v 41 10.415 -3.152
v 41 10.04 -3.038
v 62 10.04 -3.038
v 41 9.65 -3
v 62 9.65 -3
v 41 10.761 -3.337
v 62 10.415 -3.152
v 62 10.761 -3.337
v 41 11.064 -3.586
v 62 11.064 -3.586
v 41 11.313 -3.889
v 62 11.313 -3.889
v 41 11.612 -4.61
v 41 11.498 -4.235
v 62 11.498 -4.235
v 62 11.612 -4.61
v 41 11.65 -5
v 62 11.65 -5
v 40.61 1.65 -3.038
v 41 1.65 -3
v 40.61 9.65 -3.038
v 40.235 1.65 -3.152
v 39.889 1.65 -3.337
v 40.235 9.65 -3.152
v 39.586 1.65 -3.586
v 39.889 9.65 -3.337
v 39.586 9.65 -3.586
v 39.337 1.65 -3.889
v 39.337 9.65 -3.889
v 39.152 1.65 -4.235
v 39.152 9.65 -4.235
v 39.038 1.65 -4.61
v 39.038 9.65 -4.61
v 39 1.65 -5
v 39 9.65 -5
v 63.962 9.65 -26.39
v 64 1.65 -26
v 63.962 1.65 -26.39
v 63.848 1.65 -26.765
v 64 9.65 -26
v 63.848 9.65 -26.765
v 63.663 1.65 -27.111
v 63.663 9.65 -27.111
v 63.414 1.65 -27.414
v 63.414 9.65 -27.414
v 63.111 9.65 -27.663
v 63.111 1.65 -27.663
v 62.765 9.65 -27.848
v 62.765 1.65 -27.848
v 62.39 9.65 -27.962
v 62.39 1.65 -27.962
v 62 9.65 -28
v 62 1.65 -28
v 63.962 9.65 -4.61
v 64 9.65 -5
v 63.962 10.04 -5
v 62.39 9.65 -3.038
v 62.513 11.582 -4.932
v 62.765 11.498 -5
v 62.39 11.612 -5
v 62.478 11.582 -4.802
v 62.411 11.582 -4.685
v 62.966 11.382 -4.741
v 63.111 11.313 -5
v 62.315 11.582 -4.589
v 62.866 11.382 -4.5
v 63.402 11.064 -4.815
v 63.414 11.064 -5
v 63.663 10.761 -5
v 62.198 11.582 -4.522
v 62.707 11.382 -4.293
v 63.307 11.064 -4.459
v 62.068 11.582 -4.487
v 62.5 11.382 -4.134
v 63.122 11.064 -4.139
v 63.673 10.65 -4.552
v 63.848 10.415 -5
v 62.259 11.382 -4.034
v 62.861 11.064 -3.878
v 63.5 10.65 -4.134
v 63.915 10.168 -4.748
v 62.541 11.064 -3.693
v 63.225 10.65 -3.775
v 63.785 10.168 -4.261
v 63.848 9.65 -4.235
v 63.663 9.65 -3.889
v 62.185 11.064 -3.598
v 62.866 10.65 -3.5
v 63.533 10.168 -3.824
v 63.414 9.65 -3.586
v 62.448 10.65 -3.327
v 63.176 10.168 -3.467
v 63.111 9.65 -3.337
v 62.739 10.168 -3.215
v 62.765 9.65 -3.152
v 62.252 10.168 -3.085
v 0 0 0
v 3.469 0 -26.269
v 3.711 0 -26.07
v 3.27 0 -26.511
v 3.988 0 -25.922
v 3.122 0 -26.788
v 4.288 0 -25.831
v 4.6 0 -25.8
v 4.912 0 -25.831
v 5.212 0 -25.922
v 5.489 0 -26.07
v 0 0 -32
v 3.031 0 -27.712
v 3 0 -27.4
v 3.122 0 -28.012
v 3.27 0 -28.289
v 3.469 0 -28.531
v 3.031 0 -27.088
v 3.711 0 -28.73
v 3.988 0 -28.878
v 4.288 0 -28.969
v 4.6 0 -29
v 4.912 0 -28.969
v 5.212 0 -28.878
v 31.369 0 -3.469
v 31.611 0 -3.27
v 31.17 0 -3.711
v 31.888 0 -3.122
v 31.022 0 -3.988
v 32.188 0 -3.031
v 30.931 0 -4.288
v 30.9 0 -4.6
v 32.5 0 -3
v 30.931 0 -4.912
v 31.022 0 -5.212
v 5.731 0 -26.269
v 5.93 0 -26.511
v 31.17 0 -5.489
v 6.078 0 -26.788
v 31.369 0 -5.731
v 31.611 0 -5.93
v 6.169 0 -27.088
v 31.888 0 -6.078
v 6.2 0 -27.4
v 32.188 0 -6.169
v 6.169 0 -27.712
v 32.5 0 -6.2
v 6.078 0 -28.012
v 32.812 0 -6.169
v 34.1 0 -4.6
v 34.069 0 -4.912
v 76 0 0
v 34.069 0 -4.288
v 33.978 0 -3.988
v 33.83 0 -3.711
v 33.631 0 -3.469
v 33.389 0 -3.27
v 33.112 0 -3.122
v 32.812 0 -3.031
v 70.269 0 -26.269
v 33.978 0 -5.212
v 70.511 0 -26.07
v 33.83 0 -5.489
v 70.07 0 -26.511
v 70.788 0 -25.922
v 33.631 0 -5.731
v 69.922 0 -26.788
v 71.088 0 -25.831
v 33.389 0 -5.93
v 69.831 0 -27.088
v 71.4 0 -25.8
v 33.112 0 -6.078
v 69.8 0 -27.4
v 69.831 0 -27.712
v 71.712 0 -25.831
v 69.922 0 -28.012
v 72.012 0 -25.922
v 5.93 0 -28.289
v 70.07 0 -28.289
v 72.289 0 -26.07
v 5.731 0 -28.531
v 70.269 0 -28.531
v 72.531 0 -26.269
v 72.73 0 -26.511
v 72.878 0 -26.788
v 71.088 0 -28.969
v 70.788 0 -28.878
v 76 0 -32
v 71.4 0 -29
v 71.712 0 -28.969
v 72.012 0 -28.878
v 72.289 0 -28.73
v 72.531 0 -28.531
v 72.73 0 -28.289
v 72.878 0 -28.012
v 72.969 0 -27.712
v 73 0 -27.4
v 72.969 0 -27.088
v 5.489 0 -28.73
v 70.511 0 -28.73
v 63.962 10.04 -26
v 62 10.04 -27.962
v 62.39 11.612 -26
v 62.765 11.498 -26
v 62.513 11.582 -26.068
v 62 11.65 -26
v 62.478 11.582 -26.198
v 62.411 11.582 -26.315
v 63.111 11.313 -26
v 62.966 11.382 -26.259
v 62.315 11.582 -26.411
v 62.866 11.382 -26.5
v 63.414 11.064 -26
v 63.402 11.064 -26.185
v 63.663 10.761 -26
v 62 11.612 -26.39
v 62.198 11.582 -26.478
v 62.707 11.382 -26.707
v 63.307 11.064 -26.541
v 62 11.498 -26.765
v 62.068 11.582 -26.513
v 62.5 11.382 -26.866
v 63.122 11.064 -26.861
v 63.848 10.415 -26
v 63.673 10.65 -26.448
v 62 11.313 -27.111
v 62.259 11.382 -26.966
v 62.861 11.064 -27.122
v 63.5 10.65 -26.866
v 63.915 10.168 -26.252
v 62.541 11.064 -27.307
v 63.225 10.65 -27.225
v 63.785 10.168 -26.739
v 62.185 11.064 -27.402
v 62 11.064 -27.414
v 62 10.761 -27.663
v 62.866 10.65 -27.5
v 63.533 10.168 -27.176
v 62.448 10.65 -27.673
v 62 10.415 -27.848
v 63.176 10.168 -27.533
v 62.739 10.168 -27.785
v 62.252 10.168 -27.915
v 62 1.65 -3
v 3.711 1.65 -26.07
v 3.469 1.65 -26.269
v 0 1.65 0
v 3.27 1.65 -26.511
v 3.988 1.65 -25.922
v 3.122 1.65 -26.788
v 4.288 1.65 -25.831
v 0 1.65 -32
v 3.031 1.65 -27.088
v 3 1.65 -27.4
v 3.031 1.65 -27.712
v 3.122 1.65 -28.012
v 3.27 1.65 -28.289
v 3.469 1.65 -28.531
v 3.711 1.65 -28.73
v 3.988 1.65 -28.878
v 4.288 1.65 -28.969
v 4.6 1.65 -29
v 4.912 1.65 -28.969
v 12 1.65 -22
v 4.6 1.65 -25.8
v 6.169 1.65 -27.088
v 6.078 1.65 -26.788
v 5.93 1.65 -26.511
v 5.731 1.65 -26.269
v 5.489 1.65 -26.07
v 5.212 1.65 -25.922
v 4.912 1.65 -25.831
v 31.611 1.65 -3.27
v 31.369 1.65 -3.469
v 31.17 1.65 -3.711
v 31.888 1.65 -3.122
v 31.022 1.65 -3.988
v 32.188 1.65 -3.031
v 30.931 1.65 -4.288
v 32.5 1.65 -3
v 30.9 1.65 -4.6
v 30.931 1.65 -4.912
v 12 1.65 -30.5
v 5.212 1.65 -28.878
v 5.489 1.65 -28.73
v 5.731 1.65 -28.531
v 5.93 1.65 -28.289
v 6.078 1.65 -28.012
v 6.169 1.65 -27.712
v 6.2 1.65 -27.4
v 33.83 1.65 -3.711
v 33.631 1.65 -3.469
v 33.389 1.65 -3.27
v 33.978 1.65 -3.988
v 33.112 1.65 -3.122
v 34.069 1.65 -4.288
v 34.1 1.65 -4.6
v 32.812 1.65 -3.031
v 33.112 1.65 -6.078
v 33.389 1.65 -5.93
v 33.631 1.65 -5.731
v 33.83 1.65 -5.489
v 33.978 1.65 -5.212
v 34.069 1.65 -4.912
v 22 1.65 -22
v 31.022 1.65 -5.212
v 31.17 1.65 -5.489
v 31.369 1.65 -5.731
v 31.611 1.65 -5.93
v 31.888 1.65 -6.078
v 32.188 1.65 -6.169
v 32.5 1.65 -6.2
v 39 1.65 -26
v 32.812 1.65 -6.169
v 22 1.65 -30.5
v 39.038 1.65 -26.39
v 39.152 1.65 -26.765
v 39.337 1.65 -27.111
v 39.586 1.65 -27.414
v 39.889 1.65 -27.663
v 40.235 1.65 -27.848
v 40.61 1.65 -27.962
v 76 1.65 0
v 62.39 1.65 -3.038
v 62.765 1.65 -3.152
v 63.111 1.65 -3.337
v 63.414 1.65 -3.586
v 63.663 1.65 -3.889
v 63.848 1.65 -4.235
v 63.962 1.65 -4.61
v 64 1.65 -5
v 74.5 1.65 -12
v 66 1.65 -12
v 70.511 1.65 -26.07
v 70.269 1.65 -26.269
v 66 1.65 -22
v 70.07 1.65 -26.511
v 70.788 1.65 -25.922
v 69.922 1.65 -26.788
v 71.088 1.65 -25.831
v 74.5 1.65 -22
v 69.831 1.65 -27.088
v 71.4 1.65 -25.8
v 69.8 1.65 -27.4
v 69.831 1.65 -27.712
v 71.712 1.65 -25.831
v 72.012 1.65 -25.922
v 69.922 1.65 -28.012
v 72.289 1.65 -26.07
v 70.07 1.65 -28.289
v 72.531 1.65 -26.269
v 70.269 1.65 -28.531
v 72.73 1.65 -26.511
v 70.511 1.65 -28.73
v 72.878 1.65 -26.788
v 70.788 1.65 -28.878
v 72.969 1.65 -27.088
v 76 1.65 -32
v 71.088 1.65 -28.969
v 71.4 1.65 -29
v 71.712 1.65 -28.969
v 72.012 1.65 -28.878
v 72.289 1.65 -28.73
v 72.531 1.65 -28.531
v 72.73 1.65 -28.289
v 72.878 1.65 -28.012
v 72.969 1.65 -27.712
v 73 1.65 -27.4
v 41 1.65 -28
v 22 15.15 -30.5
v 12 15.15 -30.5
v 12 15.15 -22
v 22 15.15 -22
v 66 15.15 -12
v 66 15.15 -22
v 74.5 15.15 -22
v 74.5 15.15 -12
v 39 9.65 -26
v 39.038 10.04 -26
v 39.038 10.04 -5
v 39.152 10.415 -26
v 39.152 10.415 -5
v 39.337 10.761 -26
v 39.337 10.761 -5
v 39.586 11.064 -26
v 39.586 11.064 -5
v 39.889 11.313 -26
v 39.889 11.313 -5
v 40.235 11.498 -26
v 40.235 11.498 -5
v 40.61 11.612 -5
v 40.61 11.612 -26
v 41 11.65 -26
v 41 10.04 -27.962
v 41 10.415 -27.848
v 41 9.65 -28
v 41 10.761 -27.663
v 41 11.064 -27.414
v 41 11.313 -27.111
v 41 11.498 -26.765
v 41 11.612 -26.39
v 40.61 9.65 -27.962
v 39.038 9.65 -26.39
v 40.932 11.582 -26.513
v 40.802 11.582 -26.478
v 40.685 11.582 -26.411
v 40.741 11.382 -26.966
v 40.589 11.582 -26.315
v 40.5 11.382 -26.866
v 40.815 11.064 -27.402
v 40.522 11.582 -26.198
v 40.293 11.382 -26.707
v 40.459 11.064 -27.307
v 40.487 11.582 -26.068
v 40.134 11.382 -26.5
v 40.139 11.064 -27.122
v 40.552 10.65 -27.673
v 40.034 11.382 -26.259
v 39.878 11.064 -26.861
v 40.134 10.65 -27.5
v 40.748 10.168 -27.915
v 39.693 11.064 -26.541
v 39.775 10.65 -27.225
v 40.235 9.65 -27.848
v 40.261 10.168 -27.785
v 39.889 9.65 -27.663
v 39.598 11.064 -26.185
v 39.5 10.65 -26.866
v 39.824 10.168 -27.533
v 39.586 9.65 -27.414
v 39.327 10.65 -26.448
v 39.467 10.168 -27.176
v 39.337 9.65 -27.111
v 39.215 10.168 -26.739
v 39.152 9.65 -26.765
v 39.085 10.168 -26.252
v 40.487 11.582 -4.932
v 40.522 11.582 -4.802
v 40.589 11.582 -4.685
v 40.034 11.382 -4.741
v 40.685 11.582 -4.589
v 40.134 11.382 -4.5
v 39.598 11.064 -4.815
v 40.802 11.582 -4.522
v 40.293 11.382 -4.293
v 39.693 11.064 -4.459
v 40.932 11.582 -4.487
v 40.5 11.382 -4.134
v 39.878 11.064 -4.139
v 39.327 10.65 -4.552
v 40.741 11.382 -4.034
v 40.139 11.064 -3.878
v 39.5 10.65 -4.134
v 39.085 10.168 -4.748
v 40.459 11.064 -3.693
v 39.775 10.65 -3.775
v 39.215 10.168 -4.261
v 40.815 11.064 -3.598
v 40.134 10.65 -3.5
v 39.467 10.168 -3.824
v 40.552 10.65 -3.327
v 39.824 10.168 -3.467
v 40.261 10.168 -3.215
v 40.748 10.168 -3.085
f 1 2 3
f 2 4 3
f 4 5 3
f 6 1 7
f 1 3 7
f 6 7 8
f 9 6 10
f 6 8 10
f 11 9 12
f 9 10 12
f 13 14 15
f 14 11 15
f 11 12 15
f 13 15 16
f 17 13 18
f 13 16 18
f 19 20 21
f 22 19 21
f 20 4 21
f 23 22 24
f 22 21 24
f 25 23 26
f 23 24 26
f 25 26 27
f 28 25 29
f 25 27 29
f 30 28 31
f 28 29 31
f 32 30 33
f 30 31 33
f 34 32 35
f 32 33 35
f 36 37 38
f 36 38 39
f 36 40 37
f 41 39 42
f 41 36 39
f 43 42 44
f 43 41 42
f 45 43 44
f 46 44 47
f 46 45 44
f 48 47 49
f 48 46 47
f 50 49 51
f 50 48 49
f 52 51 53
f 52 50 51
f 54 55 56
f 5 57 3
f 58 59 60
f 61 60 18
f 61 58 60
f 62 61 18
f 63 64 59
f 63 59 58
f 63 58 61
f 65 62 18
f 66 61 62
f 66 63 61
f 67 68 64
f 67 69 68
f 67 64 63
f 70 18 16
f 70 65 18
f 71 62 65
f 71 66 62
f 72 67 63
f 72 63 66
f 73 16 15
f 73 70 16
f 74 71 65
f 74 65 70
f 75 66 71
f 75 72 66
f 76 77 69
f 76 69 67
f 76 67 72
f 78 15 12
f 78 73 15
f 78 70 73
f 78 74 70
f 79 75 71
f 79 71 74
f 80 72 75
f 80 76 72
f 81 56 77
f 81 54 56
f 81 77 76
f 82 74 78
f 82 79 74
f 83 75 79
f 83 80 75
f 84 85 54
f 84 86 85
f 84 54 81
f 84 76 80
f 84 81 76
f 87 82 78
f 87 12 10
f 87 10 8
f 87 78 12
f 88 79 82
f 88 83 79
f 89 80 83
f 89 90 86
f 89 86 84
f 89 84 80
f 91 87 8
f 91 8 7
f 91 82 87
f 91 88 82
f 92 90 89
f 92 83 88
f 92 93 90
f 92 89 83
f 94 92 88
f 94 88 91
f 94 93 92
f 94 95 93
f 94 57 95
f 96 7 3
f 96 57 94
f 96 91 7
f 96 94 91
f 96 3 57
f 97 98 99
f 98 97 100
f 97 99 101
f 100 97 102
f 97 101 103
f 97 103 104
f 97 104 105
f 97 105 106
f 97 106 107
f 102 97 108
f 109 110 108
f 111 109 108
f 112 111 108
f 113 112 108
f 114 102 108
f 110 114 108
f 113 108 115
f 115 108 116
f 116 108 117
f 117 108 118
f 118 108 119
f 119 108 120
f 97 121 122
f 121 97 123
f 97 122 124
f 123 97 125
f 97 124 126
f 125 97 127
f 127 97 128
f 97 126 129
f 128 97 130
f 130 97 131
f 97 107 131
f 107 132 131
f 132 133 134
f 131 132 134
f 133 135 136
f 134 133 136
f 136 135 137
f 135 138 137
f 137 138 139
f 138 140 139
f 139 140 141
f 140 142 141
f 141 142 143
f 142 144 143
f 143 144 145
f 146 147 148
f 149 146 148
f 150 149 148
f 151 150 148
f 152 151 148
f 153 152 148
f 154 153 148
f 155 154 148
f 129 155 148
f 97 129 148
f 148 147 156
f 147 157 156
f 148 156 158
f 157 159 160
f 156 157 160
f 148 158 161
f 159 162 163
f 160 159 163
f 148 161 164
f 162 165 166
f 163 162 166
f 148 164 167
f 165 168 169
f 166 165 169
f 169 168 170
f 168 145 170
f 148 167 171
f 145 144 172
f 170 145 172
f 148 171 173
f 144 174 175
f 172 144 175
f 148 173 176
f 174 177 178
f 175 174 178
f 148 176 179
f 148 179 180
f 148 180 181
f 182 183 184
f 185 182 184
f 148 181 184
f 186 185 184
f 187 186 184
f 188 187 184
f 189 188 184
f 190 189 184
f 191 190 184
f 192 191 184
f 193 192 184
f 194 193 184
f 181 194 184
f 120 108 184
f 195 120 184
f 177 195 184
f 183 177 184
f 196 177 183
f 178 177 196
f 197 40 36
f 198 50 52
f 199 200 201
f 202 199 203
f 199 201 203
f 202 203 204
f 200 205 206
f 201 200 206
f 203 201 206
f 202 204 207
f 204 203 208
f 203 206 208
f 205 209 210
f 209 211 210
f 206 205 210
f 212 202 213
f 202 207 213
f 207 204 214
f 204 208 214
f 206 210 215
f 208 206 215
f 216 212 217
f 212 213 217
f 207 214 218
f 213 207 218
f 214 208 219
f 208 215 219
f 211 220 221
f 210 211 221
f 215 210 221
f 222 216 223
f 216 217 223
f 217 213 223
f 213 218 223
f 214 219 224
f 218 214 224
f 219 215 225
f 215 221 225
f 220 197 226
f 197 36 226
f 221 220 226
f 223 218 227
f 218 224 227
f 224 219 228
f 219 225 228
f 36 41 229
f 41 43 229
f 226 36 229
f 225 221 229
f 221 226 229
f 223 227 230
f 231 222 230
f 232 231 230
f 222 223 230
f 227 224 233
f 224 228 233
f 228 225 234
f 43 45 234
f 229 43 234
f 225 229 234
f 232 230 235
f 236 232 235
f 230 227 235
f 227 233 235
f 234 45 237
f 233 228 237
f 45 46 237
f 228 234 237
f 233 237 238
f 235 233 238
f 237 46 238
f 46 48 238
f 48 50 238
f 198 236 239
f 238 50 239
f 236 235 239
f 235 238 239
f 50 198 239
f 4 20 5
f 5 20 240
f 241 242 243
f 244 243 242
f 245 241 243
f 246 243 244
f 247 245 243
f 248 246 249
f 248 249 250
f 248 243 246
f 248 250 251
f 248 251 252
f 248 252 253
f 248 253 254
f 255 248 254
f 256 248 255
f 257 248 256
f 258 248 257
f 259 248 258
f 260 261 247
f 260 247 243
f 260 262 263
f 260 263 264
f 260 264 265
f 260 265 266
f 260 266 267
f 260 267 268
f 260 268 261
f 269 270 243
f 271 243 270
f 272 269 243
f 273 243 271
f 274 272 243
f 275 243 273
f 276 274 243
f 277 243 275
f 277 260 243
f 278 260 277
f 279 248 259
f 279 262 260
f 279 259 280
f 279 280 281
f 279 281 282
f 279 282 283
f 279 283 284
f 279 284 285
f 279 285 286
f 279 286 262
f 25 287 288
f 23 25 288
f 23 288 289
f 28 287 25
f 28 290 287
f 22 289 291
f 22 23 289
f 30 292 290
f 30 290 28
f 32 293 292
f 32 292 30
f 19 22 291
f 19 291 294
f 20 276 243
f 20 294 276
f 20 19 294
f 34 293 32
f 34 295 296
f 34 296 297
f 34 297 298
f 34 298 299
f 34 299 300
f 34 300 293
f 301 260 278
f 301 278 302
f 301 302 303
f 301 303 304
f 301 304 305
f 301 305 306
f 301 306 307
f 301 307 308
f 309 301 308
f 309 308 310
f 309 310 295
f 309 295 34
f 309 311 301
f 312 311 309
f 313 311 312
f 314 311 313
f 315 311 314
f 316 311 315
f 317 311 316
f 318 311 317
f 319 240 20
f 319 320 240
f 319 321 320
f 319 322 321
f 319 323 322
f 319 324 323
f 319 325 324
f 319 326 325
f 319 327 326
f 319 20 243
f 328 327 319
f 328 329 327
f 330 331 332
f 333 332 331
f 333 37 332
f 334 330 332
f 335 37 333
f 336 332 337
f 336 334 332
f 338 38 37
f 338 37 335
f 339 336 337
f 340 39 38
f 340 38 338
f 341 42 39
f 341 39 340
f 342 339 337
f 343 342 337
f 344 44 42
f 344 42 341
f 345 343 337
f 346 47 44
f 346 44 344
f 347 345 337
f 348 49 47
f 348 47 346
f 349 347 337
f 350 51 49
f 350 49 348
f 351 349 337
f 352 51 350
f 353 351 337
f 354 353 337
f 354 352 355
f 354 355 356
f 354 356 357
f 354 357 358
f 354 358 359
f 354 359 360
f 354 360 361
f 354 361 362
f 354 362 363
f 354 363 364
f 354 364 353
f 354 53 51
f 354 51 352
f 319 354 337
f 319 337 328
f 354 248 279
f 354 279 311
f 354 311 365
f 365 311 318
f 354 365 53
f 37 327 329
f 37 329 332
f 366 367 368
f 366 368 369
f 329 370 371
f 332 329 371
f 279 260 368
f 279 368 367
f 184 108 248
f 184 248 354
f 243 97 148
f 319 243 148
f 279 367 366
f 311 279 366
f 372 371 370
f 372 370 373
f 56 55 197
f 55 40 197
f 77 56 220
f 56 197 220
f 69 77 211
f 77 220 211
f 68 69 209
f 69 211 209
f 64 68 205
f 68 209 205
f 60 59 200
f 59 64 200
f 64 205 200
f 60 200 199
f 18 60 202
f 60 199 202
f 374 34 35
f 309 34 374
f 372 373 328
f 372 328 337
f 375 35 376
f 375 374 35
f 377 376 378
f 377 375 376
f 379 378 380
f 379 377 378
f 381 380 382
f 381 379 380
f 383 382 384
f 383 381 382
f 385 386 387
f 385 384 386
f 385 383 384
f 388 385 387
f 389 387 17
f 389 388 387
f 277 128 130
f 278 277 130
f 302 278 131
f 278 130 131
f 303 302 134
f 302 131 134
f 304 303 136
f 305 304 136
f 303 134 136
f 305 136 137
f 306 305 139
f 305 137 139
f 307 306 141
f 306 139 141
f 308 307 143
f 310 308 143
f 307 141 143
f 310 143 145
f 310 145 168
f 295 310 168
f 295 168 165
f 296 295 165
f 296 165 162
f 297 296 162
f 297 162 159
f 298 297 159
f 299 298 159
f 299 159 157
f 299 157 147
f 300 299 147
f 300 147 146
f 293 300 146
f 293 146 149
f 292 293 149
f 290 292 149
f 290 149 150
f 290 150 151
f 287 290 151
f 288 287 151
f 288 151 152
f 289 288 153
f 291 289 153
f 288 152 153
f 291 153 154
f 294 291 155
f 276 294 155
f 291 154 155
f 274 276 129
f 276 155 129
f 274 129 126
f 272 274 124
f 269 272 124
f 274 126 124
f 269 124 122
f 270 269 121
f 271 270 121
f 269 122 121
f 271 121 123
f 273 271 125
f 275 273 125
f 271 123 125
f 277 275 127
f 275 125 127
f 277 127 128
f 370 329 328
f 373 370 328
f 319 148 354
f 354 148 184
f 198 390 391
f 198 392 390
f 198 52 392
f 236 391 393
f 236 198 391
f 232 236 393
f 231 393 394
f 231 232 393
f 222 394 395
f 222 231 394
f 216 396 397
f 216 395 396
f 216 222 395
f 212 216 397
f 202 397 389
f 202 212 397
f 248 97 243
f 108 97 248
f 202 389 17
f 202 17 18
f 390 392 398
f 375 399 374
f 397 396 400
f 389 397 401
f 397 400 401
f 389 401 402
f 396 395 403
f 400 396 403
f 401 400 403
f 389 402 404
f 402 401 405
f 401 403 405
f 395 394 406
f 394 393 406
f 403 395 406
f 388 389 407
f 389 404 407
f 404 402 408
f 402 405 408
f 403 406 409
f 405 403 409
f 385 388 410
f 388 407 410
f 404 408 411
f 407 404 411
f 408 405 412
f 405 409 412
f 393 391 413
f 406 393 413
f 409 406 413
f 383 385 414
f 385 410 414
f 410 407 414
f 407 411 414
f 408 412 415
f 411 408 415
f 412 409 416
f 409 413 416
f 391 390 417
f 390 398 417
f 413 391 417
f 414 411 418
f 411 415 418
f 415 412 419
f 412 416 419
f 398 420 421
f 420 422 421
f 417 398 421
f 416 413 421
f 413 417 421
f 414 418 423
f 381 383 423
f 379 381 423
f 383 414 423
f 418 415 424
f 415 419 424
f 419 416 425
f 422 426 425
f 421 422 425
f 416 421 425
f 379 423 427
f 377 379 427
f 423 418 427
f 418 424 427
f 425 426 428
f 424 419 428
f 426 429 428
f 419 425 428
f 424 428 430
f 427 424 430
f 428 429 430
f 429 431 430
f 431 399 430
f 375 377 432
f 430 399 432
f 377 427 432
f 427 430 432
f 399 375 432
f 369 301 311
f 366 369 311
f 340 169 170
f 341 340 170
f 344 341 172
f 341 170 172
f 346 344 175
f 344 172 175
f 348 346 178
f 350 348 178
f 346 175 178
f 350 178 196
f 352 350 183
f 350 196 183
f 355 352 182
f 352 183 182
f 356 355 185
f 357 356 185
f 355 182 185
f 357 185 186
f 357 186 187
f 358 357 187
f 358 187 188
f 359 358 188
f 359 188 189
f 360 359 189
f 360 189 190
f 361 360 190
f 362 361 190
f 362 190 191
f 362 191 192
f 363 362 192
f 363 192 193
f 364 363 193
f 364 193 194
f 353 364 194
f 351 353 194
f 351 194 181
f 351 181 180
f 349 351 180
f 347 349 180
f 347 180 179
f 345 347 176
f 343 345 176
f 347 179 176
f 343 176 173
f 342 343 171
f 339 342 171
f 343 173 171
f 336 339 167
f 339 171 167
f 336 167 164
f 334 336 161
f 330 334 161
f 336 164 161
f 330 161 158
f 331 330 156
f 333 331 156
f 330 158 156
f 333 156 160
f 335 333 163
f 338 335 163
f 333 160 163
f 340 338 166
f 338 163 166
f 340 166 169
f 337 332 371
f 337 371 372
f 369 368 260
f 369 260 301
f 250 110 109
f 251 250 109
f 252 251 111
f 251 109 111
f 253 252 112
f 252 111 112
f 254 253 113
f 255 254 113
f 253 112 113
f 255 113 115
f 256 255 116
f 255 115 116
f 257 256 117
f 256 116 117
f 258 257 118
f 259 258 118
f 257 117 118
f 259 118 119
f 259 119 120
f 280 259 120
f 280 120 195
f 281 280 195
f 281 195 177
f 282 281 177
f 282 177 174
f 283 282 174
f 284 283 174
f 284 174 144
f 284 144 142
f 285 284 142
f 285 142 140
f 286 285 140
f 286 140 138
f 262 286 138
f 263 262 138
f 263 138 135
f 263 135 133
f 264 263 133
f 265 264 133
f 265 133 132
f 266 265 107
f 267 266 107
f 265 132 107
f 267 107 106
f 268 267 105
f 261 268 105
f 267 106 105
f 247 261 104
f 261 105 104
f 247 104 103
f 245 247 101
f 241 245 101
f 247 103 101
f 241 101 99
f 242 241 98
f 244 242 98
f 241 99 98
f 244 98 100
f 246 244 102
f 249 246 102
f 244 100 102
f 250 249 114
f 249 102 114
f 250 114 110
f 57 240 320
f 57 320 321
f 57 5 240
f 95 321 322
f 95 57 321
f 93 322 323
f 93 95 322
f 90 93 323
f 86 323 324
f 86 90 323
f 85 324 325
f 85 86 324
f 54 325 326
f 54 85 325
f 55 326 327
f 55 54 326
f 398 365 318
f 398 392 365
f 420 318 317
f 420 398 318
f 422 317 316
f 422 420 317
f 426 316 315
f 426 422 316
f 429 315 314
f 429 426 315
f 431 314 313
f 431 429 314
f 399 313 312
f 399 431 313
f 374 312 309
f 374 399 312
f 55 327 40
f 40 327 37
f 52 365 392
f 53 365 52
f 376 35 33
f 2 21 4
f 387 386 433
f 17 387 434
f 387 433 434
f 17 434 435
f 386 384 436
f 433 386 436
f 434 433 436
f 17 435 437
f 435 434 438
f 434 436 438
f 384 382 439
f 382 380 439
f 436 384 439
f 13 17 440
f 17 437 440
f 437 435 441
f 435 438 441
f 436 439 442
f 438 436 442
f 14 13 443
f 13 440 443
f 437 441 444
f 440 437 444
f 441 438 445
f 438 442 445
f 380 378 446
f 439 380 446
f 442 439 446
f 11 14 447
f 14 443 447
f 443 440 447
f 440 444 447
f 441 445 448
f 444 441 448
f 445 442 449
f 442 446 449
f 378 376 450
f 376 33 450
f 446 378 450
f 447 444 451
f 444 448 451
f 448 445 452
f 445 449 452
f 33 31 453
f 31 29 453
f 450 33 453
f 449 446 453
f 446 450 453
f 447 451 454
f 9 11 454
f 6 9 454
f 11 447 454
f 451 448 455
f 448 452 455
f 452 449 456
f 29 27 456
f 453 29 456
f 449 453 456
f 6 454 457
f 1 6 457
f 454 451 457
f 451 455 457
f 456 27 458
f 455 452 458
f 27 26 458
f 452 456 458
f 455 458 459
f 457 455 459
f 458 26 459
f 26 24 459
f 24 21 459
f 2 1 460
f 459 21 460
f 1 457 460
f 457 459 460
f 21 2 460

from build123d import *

# Parameters (mm, degrees)
SKETCH1_W                = 76
SKETCH1_H                = 32
BOSS_EXTRUDE1_DEPTH      = 1.65
M3_CLEARANCE_HOLE1_D     = 3.2
M3_CLEARANCE_HOLE1_DEPTH = 20
M3_CLEARANCE_HOLE1_TIP   = 0.96137699
SKETCH4_W                = 10
SKETCH4_H                = 8.5
SKETCH4_W_2              = 8.5
SKETCH4_H_2              = 10
BOSS_EXTRUDE2_DEPTH      = 13.5
SKETCH5_W                = 25
SKETCH5_H                = 25
BOSS_EXTRUDE3_DEPTH      = 10
FILLET1_R                = 2


with BuildPart() as part:
    # Sketch1 → Boss-Extrude1 (new body)
    with BuildSketch(Plane(origin=(0, 0, 0), x_dir=(1, 0, 0), z_dir=(0, 1, 0))):
        with Locations((38, 16)):
            Rectangle(SKETCH1_W, SKETCH1_H)
    extrude(amount=BOSS_EXTRUDE1_DEPTH)

    # M3 Clearance Hole1
    with Locations(Plane(origin=(0, 1.65, 0), x_dir=(1, 0, 0), z_dir=(0, 1, 0))):
        with Locations((71.4, 27.4), (32.5, 4.6), (4.6, 27.4)):
            Hole(M3_CLEARANCE_HOLE1_D / 2, depth=M3_CLEARANCE_HOLE1_DEPTH)
            with Locations((0, 0, -(M3_CLEARANCE_HOLE1_DEPTH + M3_CLEARANCE_HOLE1_TIP / 2))):  # 118° drill point
                Cone(0, M3_CLEARANCE_HOLE1_D / 2, M3_CLEARANCE_HOLE1_TIP, mode=Mode.SUBTRACT)

    # Sketch4 → Boss-Extrude2 (add)
    with BuildSketch(Plane(origin=(0, 1.65, 0), x_dir=(1, 0, 0), z_dir=(0, 1, 0))):
        with Locations((17, 26.25)):
            Rectangle(SKETCH4_W, SKETCH4_H)
        with Locations((70.25, 17)):
            Rectangle(SKETCH4_W_2, SKETCH4_H_2)
    extrude(amount=BOSS_EXTRUDE2_DEPTH)

    # Sketch5 → Boss-Extrude3 (add)
    with BuildSketch(Plane(origin=(0, 1.65, 0), x_dir=(1, 0, 0), z_dir=(0, 1, 0))):
        with Locations((51.5, 15.5)):
            Rectangle(SKETCH5_W, SKETCH5_H)
    extrude(amount=BOSS_EXTRUDE3_DEPTH)

    # Fillet1
    fillet1_edges = [part.edges().sort_by_distance(p)[0] for p in [
        (64, 6.65, -3),
        (64, 6.65, -28),
        (39, 6.65, -28),
        (39, 6.65, -3),
        (64, 11.65, -15.5),
        (51.5, 11.65, -28),
        (39, 11.65, -15.5),
        (51.5, 11.65, -3),
    ]]
    fillet(fillet1_edges, radius=FILLET1_R)


solid = part.part
